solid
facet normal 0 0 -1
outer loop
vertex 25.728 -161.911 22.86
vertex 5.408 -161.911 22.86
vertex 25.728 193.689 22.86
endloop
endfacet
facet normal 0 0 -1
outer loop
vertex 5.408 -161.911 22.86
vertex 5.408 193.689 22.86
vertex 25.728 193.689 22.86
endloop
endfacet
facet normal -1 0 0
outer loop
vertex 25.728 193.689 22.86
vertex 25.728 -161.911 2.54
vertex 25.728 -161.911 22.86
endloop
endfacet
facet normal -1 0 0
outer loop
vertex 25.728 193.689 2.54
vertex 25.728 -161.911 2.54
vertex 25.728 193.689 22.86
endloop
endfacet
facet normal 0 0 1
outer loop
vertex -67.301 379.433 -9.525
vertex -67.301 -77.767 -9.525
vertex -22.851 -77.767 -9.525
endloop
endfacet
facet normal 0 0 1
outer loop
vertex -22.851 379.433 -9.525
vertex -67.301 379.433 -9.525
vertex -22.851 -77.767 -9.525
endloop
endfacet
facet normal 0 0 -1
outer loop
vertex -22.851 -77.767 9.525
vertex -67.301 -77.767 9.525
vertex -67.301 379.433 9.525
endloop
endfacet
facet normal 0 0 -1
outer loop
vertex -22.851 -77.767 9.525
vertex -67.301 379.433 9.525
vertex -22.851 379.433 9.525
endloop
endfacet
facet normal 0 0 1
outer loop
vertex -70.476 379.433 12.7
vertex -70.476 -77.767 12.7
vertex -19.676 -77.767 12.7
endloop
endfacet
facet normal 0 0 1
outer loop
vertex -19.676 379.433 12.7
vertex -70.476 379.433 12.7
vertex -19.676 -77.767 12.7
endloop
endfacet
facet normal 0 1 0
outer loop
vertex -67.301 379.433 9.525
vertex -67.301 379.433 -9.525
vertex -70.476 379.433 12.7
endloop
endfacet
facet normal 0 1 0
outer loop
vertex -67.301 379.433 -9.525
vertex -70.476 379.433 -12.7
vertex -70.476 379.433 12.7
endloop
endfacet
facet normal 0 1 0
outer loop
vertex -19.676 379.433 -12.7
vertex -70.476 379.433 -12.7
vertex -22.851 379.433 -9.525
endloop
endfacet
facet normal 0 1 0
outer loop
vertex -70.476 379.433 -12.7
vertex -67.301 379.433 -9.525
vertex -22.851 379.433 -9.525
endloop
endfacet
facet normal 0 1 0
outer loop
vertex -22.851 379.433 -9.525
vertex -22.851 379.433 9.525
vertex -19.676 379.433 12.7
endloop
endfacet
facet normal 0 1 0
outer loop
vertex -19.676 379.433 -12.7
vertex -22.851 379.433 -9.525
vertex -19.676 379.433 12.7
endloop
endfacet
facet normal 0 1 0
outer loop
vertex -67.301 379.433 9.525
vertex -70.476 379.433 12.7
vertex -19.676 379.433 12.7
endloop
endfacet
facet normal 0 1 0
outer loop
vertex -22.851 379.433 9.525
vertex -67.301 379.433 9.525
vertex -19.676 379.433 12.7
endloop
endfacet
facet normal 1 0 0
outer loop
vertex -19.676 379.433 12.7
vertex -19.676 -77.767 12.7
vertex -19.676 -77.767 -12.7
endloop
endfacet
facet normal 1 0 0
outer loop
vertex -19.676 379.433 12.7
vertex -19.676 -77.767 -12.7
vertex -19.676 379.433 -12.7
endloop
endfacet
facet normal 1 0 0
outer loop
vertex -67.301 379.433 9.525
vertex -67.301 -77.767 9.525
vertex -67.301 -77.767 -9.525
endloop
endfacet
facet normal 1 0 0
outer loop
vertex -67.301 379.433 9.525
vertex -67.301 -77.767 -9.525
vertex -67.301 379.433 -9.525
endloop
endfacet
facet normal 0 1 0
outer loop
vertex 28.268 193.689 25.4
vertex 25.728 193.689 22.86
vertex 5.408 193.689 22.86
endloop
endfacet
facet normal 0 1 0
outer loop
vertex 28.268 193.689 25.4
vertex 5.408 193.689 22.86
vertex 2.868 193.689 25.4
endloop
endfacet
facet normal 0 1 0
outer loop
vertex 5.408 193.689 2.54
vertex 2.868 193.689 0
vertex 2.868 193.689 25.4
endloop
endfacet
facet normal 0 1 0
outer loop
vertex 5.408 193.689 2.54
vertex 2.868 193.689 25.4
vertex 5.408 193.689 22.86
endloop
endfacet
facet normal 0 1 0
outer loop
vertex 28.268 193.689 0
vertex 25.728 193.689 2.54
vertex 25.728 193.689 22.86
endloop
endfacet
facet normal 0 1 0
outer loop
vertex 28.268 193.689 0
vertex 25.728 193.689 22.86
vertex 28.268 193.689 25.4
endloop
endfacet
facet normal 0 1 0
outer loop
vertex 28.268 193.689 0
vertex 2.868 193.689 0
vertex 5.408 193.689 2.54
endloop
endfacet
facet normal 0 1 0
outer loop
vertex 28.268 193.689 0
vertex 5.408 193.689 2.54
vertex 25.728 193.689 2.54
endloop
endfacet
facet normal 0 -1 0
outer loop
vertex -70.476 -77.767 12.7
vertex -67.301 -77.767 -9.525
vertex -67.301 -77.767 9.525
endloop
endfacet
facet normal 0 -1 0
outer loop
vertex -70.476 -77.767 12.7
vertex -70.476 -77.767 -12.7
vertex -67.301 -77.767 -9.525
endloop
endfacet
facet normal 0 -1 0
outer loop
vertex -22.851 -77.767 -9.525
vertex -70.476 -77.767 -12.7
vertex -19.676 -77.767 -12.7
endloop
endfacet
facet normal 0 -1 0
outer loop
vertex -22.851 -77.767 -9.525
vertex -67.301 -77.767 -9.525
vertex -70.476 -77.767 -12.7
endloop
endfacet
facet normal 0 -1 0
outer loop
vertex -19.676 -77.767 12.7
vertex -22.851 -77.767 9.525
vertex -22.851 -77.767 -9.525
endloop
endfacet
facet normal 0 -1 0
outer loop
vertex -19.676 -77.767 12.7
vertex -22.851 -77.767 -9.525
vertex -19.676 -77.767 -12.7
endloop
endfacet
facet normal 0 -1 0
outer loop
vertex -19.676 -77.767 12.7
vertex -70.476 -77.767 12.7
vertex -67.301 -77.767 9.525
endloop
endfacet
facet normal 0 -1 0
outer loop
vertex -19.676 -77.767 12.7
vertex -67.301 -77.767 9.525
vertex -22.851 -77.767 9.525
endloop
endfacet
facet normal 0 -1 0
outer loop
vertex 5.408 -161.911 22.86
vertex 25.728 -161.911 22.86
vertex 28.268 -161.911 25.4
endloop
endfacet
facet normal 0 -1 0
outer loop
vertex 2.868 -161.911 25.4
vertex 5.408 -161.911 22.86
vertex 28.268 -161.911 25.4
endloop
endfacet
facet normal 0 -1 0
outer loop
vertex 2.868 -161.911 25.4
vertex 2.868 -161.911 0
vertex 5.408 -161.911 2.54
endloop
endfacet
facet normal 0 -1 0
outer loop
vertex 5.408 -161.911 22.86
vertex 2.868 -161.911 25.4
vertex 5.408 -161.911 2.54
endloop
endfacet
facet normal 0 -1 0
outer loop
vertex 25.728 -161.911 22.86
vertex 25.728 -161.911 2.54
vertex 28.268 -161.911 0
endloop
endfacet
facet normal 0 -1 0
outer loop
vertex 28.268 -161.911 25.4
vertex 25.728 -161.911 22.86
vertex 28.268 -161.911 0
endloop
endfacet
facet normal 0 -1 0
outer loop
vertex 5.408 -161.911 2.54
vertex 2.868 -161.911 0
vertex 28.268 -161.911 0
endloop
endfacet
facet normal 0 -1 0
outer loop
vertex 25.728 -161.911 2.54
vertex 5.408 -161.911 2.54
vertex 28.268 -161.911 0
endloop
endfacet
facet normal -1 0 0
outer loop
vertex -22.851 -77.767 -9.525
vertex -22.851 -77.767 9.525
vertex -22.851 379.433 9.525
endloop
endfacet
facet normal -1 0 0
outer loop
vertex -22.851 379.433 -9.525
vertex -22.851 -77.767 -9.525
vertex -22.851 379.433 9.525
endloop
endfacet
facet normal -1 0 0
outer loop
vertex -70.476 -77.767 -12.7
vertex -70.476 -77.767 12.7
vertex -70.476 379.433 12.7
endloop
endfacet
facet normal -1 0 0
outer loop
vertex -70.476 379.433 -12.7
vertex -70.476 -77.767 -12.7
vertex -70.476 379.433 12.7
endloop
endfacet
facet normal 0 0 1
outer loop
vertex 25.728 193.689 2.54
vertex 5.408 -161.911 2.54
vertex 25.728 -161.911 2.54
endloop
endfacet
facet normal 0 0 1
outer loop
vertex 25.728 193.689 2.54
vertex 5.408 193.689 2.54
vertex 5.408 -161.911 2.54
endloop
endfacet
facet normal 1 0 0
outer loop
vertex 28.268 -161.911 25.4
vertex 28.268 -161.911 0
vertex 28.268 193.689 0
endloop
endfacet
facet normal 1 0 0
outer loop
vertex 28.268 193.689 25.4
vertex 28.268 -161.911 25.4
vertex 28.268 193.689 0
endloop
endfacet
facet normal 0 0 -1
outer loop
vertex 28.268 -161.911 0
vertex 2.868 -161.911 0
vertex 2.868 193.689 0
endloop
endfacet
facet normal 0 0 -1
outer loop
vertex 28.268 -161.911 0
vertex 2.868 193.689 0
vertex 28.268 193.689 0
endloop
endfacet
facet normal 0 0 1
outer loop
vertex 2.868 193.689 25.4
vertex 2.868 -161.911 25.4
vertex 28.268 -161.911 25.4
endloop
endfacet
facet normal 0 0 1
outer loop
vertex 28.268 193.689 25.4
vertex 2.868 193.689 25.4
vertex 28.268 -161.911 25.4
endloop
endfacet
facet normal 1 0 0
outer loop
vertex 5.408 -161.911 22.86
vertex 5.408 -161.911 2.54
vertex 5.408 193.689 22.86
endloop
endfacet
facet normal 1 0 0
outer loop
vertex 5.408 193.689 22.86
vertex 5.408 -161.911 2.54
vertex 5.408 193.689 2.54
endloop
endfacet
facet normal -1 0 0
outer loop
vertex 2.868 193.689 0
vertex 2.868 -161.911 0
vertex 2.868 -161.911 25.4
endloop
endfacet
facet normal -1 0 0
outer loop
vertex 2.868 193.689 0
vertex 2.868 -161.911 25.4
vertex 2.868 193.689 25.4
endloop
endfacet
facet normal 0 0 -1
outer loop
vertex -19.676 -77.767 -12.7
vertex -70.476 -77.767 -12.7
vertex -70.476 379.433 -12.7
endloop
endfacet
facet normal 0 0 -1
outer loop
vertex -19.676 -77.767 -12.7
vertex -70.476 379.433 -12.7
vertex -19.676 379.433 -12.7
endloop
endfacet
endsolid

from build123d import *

# Parameters (mm, degrees)
F0_W     = 50.8
F0_H     = 457.2
F1_DEPTH = 12.7
F2_T     = -3.175
F3_W     = 25.4
F3_H     = 355.6
F4_DEPTH = 25.4
F5_T     = -2.54


with BuildPart() as f1:
    # F0 (on Top) → F1 (new body, symmetric)
    with BuildSketch(Plane.XY):
        with Locations((-45.076435, 150.832766)):
            Rectangle(F0_W, F0_H)
    extrude(amount=F1_DEPTH, both=True)

    # F2
    f2_openings = [f1.faces().sort_by_distance(p)[0] for p in [
        (-45.076435, 379.432766, 0),
        (-45.076435, -77.767234, 0),
    ]]
    offset(amount=F2_T, openings=f2_openings)


with BuildPart() as f4:
    # F3 (on Top) → F4 (new body)
    with BuildSketch(Plane.XY):
        with Locations((15.568008, 15.888512)):
            Rectangle(F3_W, F3_H)
    extrude(amount=F4_DEPTH)

    # F5
    f5_openings = [f4.faces().sort_by_distance(p)[0] for p in [
        (15.568008, 193.688512, 12.7),
        (15.568008, -161.911488, 12.7),
    ]]
    offset(amount=F5_T, openings=f5_openings)


solid = Compound([f1.part, f4.part])
